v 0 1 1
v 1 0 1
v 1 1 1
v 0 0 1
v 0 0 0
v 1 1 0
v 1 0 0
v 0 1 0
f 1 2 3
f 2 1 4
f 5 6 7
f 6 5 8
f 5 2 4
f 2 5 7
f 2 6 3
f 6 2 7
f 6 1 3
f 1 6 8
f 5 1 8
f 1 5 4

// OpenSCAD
color("CornflowerBlue")cube(width = 1, height = 1, depth = 1);
